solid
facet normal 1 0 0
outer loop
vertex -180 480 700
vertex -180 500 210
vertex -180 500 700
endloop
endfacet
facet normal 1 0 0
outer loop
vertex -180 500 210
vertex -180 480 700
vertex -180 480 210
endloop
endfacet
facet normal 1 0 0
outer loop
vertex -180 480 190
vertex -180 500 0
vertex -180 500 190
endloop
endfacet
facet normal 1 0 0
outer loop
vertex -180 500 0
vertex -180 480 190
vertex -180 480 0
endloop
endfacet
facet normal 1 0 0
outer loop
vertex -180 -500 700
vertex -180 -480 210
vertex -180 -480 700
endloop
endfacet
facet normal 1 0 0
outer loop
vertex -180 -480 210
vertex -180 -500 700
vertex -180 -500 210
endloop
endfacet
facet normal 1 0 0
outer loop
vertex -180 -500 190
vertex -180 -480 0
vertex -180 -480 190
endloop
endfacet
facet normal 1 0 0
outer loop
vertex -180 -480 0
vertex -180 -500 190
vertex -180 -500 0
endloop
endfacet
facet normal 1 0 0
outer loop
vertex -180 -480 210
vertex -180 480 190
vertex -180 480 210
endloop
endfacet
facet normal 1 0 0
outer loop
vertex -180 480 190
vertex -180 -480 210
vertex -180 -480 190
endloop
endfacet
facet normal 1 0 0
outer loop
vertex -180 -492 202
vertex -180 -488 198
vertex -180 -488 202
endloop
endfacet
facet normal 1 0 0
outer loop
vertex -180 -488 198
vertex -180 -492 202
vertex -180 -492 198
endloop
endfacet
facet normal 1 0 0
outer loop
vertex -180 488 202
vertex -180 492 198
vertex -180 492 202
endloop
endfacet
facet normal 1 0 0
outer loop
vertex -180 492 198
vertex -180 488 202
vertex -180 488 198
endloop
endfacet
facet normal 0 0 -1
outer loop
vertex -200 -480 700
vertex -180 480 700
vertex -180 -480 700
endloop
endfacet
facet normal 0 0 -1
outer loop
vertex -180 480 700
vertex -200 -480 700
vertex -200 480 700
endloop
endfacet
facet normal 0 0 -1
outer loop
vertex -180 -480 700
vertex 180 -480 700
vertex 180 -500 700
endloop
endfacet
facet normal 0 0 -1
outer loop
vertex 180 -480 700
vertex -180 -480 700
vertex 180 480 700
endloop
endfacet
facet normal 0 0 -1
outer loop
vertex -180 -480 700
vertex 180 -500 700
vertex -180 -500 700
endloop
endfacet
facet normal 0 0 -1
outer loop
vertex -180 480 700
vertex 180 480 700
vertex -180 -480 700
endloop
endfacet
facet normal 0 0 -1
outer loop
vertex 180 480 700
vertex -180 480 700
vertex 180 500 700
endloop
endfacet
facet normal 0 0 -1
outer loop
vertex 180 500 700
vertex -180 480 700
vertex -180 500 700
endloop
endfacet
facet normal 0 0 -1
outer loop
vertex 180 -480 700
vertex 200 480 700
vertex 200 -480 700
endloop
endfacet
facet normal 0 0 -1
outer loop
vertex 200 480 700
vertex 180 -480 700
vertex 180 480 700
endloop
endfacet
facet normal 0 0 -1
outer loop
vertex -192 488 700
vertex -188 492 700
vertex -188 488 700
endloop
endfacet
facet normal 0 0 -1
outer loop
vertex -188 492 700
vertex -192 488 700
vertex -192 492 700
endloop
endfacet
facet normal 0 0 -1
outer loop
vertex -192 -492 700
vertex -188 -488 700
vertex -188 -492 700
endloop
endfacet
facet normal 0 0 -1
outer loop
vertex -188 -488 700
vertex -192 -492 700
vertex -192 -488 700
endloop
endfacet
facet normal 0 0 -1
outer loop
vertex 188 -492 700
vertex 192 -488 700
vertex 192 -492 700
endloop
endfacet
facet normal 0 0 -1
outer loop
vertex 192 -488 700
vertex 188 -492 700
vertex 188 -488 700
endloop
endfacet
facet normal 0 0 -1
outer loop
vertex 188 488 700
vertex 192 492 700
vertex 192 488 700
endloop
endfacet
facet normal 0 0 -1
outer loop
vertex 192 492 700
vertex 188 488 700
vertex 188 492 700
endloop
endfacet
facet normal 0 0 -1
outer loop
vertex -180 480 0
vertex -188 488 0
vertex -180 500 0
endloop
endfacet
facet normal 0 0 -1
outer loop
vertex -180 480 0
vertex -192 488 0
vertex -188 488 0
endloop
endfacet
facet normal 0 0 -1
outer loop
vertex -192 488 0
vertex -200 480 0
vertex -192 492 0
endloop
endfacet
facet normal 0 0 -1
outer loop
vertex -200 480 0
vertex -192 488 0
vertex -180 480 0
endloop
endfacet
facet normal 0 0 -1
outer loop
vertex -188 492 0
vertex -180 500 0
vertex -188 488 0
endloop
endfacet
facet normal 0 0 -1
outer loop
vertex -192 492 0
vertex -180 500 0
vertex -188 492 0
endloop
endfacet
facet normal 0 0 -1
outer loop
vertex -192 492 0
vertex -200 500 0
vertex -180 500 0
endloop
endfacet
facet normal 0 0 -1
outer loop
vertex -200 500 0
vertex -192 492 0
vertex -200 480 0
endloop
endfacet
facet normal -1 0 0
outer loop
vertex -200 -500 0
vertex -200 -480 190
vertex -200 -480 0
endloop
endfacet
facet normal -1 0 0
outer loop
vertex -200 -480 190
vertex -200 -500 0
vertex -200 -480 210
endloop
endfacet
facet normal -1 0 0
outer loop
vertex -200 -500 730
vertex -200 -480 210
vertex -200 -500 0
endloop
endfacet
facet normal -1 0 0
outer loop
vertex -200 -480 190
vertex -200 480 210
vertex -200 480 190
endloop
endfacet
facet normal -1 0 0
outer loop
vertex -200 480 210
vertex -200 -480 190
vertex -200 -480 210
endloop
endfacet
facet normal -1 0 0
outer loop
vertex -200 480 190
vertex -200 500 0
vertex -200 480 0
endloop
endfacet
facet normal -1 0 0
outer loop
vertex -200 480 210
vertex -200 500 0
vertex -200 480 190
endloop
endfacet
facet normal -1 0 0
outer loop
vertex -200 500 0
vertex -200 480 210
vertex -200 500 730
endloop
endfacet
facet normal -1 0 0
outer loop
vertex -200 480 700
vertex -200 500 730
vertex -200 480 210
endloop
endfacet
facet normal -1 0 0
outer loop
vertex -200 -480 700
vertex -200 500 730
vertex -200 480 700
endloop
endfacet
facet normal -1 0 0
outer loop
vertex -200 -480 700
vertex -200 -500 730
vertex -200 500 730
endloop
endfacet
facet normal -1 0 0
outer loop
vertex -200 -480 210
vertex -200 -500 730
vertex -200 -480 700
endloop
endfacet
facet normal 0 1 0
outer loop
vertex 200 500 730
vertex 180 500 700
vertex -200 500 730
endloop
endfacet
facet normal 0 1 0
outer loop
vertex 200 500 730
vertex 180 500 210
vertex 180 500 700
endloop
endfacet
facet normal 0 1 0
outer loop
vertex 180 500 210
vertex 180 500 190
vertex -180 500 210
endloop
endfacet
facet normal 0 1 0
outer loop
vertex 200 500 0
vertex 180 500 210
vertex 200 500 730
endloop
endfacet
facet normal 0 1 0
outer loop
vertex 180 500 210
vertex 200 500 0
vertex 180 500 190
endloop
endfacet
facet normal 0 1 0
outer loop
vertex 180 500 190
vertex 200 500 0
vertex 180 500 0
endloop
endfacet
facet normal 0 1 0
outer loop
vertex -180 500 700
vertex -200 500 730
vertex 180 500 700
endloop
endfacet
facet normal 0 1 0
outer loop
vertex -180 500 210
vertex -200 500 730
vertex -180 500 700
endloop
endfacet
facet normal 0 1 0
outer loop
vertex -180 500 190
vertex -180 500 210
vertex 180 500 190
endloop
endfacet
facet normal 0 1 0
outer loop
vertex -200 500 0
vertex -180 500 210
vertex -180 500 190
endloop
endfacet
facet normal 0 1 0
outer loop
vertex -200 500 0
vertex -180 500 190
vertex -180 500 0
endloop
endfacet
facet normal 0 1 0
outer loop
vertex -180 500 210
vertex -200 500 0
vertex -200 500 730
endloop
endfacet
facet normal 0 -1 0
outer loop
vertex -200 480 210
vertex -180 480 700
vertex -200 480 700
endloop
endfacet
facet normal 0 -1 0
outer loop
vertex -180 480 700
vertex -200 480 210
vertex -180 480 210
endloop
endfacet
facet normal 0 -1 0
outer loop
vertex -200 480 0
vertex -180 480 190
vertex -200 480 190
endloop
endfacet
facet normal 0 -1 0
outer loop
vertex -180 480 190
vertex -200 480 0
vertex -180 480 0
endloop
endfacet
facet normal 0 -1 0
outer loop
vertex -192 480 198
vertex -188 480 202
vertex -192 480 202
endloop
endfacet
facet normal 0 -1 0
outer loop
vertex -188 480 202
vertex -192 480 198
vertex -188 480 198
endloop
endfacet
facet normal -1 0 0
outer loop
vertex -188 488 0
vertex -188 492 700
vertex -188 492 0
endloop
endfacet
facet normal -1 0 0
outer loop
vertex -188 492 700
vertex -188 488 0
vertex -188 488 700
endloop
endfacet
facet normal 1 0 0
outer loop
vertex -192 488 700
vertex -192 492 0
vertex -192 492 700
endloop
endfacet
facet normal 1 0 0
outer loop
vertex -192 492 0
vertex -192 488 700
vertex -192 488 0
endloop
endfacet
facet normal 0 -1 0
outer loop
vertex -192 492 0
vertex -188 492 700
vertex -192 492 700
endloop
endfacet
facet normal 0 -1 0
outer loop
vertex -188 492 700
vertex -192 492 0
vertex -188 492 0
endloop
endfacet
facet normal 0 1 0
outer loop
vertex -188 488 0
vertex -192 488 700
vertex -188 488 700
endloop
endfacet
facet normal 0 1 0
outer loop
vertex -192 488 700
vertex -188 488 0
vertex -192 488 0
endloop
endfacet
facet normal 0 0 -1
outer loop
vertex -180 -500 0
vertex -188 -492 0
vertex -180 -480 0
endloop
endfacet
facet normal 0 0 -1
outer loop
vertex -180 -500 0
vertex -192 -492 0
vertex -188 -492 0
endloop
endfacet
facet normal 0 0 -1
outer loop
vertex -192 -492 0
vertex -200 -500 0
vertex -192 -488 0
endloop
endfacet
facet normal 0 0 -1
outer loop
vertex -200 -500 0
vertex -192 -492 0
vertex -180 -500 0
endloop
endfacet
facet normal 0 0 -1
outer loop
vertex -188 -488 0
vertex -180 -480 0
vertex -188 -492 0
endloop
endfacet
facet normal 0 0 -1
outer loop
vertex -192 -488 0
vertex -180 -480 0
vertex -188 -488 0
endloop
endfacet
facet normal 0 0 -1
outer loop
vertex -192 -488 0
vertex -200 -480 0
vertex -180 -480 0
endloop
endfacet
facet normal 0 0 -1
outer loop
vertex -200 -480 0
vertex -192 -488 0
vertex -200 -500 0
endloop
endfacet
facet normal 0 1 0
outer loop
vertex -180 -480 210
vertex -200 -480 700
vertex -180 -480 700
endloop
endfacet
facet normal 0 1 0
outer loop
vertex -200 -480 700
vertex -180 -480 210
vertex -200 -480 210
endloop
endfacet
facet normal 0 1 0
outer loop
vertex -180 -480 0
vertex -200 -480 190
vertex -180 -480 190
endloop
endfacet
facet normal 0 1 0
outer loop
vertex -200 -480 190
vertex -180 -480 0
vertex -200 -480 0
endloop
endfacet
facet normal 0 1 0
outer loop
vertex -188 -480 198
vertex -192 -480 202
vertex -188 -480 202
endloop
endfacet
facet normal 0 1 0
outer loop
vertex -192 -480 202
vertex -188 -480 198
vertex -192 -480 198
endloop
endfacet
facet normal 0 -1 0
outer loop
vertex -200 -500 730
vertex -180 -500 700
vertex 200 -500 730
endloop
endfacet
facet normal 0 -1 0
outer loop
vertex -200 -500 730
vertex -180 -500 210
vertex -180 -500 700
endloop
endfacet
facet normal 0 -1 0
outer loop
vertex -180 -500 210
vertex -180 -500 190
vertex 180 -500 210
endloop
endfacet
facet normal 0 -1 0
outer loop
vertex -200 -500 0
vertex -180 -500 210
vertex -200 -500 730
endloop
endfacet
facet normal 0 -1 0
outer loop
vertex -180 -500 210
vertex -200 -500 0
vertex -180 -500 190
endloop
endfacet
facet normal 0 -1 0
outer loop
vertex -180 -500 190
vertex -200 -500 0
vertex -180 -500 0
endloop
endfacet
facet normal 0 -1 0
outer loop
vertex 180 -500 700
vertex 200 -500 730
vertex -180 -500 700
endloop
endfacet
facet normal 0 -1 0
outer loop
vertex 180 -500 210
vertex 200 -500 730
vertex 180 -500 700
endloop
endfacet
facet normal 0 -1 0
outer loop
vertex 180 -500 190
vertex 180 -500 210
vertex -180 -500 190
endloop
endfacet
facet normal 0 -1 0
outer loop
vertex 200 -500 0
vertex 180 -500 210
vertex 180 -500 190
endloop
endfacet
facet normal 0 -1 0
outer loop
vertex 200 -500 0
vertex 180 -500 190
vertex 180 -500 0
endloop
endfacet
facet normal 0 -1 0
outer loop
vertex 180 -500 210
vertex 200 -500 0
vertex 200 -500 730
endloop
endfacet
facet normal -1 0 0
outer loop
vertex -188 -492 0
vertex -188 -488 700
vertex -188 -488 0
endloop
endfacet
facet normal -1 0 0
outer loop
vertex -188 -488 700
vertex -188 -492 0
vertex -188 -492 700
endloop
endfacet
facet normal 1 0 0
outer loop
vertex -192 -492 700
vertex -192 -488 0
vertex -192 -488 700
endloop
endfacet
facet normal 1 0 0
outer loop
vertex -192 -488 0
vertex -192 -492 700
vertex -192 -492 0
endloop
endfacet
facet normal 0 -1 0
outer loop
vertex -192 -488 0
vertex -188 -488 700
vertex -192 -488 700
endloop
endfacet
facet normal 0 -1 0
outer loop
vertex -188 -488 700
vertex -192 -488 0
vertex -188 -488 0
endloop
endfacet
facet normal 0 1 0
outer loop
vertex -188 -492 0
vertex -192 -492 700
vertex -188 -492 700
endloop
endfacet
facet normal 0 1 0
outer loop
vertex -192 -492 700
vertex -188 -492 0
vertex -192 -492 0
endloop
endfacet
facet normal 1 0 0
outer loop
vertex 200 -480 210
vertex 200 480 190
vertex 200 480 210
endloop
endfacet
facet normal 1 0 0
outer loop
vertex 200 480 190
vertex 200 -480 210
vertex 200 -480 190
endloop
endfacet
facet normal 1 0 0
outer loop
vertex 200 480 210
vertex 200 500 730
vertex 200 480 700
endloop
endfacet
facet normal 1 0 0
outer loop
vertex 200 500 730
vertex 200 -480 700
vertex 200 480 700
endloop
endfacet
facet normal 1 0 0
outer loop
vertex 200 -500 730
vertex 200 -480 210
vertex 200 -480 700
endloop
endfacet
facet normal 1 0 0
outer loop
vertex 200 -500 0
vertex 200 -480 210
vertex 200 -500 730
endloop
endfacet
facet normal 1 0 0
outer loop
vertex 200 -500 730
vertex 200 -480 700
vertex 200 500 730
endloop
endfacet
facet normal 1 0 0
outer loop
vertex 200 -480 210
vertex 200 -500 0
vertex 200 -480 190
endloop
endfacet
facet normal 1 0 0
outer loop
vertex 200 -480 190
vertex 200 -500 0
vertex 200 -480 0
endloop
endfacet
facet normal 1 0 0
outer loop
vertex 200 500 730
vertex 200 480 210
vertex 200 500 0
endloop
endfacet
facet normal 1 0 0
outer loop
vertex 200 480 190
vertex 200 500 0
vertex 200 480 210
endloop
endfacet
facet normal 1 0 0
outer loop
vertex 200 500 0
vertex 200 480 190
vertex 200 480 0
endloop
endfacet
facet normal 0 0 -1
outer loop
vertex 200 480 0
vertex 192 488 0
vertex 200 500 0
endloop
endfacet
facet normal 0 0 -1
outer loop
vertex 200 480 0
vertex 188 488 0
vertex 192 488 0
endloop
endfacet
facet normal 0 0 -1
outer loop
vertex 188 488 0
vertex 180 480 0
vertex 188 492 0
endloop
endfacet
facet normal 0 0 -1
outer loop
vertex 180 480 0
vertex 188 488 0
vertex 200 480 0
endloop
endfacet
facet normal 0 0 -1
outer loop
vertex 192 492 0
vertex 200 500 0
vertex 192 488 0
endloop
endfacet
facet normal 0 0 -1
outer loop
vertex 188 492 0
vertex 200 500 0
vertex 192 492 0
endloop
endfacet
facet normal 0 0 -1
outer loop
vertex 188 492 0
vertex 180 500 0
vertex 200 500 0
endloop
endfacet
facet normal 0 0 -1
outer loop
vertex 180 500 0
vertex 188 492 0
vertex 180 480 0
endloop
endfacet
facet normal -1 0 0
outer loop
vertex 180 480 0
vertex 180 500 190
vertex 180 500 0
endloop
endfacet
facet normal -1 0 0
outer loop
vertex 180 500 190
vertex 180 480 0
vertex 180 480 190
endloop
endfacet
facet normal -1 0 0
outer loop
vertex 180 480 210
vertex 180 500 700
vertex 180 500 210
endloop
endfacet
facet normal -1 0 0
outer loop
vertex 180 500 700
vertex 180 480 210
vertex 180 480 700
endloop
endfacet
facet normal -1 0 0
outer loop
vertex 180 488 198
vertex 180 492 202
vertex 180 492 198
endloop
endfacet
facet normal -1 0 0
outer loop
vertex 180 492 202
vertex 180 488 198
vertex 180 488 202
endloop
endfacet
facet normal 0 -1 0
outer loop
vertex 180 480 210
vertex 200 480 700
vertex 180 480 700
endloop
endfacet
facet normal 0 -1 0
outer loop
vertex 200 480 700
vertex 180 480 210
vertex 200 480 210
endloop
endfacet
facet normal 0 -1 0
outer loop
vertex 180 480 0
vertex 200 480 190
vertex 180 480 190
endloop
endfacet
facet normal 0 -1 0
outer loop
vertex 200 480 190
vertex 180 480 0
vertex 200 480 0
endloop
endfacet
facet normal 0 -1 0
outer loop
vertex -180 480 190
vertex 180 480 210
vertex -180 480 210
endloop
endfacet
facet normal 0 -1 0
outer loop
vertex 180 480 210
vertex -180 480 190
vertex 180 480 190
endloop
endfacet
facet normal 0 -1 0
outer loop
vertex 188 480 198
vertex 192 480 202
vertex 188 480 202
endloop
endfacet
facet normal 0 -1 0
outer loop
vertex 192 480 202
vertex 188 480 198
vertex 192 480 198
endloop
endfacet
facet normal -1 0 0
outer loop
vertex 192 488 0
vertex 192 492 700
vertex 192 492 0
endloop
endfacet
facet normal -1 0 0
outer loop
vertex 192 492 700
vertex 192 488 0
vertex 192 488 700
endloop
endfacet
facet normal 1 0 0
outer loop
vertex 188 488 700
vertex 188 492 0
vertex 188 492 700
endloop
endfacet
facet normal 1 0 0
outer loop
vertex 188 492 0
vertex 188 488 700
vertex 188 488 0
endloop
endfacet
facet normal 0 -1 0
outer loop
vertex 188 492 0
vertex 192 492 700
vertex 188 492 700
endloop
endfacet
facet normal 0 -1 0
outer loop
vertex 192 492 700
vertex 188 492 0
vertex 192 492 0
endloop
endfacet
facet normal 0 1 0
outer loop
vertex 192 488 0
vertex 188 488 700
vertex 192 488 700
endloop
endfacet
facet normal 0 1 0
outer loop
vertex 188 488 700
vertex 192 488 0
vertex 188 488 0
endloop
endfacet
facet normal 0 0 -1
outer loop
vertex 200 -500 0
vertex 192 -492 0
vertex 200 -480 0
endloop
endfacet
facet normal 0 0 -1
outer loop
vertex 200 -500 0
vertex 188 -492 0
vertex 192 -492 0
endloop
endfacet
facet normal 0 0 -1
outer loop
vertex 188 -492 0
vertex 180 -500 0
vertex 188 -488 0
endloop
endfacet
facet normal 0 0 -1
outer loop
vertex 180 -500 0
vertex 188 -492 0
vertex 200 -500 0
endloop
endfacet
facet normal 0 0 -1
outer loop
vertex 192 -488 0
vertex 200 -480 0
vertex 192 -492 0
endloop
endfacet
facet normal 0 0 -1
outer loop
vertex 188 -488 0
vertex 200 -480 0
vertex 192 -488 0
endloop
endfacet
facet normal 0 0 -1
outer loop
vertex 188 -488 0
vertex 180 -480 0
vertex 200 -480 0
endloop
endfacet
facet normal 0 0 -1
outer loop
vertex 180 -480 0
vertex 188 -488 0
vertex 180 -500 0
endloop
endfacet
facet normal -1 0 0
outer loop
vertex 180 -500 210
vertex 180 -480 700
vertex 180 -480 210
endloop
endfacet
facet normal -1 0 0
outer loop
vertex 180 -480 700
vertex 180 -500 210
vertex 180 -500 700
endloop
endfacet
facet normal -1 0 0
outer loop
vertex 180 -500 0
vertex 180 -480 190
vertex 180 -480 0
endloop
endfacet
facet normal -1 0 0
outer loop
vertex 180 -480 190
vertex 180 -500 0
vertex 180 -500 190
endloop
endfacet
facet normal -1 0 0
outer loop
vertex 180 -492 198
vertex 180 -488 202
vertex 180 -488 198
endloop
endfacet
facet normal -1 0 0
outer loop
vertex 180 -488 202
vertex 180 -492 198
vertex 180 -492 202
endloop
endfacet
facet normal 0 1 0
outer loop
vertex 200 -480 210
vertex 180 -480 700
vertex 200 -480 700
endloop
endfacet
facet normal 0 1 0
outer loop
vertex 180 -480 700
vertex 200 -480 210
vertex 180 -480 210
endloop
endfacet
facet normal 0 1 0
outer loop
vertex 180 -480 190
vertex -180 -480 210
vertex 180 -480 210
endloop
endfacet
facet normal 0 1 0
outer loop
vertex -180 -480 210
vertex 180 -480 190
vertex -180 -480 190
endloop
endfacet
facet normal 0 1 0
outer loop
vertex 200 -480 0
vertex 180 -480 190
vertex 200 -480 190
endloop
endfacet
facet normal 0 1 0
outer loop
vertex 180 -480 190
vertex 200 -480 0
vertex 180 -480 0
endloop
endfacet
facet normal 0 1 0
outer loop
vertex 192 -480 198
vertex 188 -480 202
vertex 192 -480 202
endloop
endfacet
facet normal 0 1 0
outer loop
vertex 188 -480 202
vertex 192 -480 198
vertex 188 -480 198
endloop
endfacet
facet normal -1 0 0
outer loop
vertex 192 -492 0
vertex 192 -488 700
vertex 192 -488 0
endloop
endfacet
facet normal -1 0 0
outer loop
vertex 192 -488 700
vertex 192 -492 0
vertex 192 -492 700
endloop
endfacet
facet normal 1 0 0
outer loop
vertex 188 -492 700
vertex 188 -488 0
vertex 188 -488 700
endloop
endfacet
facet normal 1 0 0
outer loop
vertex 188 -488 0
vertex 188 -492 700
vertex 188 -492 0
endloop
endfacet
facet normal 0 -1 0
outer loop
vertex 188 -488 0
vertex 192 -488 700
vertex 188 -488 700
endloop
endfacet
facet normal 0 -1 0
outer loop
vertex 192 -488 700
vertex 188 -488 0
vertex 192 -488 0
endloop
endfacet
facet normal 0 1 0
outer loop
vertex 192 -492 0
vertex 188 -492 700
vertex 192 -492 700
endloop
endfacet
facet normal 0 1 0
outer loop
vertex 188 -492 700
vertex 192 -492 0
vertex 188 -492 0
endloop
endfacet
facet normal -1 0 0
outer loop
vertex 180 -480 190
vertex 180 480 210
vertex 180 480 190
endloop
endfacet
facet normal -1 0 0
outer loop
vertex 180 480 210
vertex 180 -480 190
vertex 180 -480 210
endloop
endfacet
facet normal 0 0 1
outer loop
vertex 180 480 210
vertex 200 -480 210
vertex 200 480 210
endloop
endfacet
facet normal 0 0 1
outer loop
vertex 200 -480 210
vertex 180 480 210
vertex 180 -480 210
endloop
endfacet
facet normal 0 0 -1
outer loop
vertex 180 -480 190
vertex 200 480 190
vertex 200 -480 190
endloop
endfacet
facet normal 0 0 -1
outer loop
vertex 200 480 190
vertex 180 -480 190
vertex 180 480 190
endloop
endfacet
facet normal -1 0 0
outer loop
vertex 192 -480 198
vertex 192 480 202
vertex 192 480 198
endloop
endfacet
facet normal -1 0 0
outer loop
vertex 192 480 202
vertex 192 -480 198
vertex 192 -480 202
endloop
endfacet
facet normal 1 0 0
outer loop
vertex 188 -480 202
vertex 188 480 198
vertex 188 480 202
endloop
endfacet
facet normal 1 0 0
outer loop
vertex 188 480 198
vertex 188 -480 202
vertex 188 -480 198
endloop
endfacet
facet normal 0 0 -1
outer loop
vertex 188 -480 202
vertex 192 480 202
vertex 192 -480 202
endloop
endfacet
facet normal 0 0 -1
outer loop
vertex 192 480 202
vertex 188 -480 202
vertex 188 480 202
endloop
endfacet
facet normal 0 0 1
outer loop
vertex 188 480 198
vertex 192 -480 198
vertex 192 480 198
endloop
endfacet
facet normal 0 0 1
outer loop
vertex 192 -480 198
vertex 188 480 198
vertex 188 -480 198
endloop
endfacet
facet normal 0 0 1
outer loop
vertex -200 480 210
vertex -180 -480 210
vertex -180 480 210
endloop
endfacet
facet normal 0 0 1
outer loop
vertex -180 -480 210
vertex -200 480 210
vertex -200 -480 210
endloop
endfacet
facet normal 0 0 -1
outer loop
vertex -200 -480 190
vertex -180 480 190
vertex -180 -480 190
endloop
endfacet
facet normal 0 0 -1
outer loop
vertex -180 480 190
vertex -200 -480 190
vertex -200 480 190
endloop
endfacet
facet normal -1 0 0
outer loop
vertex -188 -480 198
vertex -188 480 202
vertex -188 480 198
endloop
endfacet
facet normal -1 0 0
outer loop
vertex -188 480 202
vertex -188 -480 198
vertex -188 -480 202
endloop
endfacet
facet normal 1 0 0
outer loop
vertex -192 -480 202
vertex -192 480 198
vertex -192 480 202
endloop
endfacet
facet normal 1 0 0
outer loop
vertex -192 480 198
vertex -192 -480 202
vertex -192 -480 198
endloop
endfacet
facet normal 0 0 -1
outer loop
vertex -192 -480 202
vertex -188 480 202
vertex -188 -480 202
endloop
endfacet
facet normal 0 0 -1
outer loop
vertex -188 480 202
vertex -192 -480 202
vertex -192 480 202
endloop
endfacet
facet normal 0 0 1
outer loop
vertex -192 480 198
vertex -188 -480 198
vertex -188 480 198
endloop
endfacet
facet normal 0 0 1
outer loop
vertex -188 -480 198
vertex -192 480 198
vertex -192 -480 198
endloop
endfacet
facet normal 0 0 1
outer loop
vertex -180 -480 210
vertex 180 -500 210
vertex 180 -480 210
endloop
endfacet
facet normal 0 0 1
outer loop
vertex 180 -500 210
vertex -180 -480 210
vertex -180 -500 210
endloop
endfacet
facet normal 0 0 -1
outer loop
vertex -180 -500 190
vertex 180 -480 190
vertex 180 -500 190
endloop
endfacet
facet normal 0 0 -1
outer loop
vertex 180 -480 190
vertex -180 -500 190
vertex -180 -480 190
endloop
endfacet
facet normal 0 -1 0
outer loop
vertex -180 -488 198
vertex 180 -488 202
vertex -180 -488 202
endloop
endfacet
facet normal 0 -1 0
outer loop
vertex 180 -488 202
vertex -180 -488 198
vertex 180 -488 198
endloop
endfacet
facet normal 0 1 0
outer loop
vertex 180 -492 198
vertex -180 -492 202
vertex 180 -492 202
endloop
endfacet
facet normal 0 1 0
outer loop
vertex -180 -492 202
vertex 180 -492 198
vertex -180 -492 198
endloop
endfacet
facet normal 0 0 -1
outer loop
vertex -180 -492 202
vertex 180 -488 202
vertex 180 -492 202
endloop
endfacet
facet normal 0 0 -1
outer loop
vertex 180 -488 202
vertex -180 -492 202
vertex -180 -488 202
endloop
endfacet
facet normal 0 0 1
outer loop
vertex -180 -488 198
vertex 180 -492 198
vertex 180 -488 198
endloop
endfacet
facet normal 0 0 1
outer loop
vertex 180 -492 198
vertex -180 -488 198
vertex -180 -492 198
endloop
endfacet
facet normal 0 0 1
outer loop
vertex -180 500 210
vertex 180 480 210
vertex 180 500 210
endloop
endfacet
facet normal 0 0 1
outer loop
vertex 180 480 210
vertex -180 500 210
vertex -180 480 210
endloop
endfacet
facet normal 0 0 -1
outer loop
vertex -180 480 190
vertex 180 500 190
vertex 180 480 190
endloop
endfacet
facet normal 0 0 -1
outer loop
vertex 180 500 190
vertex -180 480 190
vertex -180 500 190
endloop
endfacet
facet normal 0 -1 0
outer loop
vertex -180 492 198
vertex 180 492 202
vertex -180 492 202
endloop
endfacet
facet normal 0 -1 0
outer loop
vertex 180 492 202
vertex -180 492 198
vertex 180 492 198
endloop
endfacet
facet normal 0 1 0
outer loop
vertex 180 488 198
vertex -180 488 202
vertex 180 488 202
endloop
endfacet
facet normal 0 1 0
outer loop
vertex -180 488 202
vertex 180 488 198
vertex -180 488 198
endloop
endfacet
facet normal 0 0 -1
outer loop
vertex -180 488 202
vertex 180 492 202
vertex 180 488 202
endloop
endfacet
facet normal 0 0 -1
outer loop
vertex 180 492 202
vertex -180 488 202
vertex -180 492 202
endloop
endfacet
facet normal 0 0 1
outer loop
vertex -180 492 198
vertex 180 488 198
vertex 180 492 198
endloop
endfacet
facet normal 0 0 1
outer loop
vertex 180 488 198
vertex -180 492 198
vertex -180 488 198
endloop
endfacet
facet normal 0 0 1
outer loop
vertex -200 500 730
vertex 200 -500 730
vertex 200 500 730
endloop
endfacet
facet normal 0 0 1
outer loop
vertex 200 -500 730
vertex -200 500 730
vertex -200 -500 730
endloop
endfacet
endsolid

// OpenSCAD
$fa = 1;
$fs = 0.4;

leg_width=20;
leg_length=20;
leg_height=700;

top_width=400;
top_length=1000;
top_thickness=30;

support_width=20;
support_length=20;
//support_height=top_length;

module square_tube(tube_width=50, tube_length=50, tube_height=700, wall_thickness=16){
    
    inside_width = tube_width-wall_thickness;
    inside_length = tube_length-wall_thickness;
    
    translate([0,0,tube_height/2]){
    difference(){
      cube([tube_width, tube_length, tube_height], center=true);
        
      translate([0,0,-0.5])
        
        scale([1,1,1.10])
        
        cube([inside_width,inside_length,tube_height], center=true);
    }}
}

module flat_surface(surface_width=400, surface_length=1000,surface_thickness=20, surface_height){
  translate([0,0,surface_height])
  cube([surface_width, surface_length, surface_thickness],center=true);    
    
}
// Table Legs
short_side=(top_width/2)-(leg_width/2);
long_side=(top_length/2)-(leg_length/2);

// Back
#translate ([-short_side,long_side,0])
  square_tube(tube_width=leg_width, tube_length=leg_length, tube_height=leg_height);

#translate ([-short_side,-long_side,0])
  square_tube(tube_width=leg_width, tube_length=leg_length, tube_height=leg_height);

// Front
#translate ([short_side,long_side,0])
  square_tube(tube_width=leg_width, tube_length=leg_length, tube_height=leg_height);

#translate([short_side,-long_side,0])
  square_tube(tube_width=leg_width, tube_length=leg_length, tube_height=leg_height);
  
// Table Surface
flat_surface(surface_width=top_width, surface_length=top_length, surface_height=leg_height+(top_thickness/2), surface_thickness=top_thickness);

// Supports
// Front
rotate([90,0,0]){
translate([top_width/2-support_width/2,top_width/2,(-top_length/2)+(leg_length)])
  square_tube(tube_width=support_width, tube_length=support_length, tube_height=top_length-(2*leg_length));
  
// Back
translate([-(top_width/2-support_width/2),top_width/2,(-top_length/2)+(leg_length)])
  square_tube(tube_width=support_width, tube_length=support_length, tube_height=top_length-(2*leg_length));}
  
// Side
rotate([90,0,90]){
translate([-top_length/2+leg_width/2,top_width/2,(-top_width/2)+(leg_width)])
  square_tube(tube_width=support_width, tube_length=support_length, tube_height=top_width-(2*leg_width));

// Side 2
translate([top_length/2-leg_width/2,top_width/2,(-top_width/2)+(leg_width)])
  square_tube(tube_width=support_width, tube_length=support_length, tube_height=top_width-(2*leg_width));}

/*
// Supports Under Top
// Front
rotate([90,0,0]){
translate([top_width/2-support_width/2,top_width/2,(-top_length/2)+(leg_length)])
  square_tube(tube_width=support_width, tube_length=support_length, tube_height=leg_height);
  
// Back
translate([-(top_width/2-support_width/2),top_width/2,(-top_length/2)+(leg_length)])
  square_tube(tube_width=support_width, tube_length=support_length, tube_height=top_length-(2*leg_length));}
  
// Side
rotate([90,0,90]){
translate([-top_length/2+leg_width/2,top_width/2,(-top_width/2)+(leg_width)])
  square_tube(tube_width=support_width, tube_length=support_length, tube_height=top_width-(2*leg_width));

// Side 2
translate([top_length/2-leg_width/2,top_width/2,(-top_width/2)+(leg_width)])
  square_tube(tube_width=support_width, tube_length=support_length, tube_height=top_width-(2*leg_width));}*/
